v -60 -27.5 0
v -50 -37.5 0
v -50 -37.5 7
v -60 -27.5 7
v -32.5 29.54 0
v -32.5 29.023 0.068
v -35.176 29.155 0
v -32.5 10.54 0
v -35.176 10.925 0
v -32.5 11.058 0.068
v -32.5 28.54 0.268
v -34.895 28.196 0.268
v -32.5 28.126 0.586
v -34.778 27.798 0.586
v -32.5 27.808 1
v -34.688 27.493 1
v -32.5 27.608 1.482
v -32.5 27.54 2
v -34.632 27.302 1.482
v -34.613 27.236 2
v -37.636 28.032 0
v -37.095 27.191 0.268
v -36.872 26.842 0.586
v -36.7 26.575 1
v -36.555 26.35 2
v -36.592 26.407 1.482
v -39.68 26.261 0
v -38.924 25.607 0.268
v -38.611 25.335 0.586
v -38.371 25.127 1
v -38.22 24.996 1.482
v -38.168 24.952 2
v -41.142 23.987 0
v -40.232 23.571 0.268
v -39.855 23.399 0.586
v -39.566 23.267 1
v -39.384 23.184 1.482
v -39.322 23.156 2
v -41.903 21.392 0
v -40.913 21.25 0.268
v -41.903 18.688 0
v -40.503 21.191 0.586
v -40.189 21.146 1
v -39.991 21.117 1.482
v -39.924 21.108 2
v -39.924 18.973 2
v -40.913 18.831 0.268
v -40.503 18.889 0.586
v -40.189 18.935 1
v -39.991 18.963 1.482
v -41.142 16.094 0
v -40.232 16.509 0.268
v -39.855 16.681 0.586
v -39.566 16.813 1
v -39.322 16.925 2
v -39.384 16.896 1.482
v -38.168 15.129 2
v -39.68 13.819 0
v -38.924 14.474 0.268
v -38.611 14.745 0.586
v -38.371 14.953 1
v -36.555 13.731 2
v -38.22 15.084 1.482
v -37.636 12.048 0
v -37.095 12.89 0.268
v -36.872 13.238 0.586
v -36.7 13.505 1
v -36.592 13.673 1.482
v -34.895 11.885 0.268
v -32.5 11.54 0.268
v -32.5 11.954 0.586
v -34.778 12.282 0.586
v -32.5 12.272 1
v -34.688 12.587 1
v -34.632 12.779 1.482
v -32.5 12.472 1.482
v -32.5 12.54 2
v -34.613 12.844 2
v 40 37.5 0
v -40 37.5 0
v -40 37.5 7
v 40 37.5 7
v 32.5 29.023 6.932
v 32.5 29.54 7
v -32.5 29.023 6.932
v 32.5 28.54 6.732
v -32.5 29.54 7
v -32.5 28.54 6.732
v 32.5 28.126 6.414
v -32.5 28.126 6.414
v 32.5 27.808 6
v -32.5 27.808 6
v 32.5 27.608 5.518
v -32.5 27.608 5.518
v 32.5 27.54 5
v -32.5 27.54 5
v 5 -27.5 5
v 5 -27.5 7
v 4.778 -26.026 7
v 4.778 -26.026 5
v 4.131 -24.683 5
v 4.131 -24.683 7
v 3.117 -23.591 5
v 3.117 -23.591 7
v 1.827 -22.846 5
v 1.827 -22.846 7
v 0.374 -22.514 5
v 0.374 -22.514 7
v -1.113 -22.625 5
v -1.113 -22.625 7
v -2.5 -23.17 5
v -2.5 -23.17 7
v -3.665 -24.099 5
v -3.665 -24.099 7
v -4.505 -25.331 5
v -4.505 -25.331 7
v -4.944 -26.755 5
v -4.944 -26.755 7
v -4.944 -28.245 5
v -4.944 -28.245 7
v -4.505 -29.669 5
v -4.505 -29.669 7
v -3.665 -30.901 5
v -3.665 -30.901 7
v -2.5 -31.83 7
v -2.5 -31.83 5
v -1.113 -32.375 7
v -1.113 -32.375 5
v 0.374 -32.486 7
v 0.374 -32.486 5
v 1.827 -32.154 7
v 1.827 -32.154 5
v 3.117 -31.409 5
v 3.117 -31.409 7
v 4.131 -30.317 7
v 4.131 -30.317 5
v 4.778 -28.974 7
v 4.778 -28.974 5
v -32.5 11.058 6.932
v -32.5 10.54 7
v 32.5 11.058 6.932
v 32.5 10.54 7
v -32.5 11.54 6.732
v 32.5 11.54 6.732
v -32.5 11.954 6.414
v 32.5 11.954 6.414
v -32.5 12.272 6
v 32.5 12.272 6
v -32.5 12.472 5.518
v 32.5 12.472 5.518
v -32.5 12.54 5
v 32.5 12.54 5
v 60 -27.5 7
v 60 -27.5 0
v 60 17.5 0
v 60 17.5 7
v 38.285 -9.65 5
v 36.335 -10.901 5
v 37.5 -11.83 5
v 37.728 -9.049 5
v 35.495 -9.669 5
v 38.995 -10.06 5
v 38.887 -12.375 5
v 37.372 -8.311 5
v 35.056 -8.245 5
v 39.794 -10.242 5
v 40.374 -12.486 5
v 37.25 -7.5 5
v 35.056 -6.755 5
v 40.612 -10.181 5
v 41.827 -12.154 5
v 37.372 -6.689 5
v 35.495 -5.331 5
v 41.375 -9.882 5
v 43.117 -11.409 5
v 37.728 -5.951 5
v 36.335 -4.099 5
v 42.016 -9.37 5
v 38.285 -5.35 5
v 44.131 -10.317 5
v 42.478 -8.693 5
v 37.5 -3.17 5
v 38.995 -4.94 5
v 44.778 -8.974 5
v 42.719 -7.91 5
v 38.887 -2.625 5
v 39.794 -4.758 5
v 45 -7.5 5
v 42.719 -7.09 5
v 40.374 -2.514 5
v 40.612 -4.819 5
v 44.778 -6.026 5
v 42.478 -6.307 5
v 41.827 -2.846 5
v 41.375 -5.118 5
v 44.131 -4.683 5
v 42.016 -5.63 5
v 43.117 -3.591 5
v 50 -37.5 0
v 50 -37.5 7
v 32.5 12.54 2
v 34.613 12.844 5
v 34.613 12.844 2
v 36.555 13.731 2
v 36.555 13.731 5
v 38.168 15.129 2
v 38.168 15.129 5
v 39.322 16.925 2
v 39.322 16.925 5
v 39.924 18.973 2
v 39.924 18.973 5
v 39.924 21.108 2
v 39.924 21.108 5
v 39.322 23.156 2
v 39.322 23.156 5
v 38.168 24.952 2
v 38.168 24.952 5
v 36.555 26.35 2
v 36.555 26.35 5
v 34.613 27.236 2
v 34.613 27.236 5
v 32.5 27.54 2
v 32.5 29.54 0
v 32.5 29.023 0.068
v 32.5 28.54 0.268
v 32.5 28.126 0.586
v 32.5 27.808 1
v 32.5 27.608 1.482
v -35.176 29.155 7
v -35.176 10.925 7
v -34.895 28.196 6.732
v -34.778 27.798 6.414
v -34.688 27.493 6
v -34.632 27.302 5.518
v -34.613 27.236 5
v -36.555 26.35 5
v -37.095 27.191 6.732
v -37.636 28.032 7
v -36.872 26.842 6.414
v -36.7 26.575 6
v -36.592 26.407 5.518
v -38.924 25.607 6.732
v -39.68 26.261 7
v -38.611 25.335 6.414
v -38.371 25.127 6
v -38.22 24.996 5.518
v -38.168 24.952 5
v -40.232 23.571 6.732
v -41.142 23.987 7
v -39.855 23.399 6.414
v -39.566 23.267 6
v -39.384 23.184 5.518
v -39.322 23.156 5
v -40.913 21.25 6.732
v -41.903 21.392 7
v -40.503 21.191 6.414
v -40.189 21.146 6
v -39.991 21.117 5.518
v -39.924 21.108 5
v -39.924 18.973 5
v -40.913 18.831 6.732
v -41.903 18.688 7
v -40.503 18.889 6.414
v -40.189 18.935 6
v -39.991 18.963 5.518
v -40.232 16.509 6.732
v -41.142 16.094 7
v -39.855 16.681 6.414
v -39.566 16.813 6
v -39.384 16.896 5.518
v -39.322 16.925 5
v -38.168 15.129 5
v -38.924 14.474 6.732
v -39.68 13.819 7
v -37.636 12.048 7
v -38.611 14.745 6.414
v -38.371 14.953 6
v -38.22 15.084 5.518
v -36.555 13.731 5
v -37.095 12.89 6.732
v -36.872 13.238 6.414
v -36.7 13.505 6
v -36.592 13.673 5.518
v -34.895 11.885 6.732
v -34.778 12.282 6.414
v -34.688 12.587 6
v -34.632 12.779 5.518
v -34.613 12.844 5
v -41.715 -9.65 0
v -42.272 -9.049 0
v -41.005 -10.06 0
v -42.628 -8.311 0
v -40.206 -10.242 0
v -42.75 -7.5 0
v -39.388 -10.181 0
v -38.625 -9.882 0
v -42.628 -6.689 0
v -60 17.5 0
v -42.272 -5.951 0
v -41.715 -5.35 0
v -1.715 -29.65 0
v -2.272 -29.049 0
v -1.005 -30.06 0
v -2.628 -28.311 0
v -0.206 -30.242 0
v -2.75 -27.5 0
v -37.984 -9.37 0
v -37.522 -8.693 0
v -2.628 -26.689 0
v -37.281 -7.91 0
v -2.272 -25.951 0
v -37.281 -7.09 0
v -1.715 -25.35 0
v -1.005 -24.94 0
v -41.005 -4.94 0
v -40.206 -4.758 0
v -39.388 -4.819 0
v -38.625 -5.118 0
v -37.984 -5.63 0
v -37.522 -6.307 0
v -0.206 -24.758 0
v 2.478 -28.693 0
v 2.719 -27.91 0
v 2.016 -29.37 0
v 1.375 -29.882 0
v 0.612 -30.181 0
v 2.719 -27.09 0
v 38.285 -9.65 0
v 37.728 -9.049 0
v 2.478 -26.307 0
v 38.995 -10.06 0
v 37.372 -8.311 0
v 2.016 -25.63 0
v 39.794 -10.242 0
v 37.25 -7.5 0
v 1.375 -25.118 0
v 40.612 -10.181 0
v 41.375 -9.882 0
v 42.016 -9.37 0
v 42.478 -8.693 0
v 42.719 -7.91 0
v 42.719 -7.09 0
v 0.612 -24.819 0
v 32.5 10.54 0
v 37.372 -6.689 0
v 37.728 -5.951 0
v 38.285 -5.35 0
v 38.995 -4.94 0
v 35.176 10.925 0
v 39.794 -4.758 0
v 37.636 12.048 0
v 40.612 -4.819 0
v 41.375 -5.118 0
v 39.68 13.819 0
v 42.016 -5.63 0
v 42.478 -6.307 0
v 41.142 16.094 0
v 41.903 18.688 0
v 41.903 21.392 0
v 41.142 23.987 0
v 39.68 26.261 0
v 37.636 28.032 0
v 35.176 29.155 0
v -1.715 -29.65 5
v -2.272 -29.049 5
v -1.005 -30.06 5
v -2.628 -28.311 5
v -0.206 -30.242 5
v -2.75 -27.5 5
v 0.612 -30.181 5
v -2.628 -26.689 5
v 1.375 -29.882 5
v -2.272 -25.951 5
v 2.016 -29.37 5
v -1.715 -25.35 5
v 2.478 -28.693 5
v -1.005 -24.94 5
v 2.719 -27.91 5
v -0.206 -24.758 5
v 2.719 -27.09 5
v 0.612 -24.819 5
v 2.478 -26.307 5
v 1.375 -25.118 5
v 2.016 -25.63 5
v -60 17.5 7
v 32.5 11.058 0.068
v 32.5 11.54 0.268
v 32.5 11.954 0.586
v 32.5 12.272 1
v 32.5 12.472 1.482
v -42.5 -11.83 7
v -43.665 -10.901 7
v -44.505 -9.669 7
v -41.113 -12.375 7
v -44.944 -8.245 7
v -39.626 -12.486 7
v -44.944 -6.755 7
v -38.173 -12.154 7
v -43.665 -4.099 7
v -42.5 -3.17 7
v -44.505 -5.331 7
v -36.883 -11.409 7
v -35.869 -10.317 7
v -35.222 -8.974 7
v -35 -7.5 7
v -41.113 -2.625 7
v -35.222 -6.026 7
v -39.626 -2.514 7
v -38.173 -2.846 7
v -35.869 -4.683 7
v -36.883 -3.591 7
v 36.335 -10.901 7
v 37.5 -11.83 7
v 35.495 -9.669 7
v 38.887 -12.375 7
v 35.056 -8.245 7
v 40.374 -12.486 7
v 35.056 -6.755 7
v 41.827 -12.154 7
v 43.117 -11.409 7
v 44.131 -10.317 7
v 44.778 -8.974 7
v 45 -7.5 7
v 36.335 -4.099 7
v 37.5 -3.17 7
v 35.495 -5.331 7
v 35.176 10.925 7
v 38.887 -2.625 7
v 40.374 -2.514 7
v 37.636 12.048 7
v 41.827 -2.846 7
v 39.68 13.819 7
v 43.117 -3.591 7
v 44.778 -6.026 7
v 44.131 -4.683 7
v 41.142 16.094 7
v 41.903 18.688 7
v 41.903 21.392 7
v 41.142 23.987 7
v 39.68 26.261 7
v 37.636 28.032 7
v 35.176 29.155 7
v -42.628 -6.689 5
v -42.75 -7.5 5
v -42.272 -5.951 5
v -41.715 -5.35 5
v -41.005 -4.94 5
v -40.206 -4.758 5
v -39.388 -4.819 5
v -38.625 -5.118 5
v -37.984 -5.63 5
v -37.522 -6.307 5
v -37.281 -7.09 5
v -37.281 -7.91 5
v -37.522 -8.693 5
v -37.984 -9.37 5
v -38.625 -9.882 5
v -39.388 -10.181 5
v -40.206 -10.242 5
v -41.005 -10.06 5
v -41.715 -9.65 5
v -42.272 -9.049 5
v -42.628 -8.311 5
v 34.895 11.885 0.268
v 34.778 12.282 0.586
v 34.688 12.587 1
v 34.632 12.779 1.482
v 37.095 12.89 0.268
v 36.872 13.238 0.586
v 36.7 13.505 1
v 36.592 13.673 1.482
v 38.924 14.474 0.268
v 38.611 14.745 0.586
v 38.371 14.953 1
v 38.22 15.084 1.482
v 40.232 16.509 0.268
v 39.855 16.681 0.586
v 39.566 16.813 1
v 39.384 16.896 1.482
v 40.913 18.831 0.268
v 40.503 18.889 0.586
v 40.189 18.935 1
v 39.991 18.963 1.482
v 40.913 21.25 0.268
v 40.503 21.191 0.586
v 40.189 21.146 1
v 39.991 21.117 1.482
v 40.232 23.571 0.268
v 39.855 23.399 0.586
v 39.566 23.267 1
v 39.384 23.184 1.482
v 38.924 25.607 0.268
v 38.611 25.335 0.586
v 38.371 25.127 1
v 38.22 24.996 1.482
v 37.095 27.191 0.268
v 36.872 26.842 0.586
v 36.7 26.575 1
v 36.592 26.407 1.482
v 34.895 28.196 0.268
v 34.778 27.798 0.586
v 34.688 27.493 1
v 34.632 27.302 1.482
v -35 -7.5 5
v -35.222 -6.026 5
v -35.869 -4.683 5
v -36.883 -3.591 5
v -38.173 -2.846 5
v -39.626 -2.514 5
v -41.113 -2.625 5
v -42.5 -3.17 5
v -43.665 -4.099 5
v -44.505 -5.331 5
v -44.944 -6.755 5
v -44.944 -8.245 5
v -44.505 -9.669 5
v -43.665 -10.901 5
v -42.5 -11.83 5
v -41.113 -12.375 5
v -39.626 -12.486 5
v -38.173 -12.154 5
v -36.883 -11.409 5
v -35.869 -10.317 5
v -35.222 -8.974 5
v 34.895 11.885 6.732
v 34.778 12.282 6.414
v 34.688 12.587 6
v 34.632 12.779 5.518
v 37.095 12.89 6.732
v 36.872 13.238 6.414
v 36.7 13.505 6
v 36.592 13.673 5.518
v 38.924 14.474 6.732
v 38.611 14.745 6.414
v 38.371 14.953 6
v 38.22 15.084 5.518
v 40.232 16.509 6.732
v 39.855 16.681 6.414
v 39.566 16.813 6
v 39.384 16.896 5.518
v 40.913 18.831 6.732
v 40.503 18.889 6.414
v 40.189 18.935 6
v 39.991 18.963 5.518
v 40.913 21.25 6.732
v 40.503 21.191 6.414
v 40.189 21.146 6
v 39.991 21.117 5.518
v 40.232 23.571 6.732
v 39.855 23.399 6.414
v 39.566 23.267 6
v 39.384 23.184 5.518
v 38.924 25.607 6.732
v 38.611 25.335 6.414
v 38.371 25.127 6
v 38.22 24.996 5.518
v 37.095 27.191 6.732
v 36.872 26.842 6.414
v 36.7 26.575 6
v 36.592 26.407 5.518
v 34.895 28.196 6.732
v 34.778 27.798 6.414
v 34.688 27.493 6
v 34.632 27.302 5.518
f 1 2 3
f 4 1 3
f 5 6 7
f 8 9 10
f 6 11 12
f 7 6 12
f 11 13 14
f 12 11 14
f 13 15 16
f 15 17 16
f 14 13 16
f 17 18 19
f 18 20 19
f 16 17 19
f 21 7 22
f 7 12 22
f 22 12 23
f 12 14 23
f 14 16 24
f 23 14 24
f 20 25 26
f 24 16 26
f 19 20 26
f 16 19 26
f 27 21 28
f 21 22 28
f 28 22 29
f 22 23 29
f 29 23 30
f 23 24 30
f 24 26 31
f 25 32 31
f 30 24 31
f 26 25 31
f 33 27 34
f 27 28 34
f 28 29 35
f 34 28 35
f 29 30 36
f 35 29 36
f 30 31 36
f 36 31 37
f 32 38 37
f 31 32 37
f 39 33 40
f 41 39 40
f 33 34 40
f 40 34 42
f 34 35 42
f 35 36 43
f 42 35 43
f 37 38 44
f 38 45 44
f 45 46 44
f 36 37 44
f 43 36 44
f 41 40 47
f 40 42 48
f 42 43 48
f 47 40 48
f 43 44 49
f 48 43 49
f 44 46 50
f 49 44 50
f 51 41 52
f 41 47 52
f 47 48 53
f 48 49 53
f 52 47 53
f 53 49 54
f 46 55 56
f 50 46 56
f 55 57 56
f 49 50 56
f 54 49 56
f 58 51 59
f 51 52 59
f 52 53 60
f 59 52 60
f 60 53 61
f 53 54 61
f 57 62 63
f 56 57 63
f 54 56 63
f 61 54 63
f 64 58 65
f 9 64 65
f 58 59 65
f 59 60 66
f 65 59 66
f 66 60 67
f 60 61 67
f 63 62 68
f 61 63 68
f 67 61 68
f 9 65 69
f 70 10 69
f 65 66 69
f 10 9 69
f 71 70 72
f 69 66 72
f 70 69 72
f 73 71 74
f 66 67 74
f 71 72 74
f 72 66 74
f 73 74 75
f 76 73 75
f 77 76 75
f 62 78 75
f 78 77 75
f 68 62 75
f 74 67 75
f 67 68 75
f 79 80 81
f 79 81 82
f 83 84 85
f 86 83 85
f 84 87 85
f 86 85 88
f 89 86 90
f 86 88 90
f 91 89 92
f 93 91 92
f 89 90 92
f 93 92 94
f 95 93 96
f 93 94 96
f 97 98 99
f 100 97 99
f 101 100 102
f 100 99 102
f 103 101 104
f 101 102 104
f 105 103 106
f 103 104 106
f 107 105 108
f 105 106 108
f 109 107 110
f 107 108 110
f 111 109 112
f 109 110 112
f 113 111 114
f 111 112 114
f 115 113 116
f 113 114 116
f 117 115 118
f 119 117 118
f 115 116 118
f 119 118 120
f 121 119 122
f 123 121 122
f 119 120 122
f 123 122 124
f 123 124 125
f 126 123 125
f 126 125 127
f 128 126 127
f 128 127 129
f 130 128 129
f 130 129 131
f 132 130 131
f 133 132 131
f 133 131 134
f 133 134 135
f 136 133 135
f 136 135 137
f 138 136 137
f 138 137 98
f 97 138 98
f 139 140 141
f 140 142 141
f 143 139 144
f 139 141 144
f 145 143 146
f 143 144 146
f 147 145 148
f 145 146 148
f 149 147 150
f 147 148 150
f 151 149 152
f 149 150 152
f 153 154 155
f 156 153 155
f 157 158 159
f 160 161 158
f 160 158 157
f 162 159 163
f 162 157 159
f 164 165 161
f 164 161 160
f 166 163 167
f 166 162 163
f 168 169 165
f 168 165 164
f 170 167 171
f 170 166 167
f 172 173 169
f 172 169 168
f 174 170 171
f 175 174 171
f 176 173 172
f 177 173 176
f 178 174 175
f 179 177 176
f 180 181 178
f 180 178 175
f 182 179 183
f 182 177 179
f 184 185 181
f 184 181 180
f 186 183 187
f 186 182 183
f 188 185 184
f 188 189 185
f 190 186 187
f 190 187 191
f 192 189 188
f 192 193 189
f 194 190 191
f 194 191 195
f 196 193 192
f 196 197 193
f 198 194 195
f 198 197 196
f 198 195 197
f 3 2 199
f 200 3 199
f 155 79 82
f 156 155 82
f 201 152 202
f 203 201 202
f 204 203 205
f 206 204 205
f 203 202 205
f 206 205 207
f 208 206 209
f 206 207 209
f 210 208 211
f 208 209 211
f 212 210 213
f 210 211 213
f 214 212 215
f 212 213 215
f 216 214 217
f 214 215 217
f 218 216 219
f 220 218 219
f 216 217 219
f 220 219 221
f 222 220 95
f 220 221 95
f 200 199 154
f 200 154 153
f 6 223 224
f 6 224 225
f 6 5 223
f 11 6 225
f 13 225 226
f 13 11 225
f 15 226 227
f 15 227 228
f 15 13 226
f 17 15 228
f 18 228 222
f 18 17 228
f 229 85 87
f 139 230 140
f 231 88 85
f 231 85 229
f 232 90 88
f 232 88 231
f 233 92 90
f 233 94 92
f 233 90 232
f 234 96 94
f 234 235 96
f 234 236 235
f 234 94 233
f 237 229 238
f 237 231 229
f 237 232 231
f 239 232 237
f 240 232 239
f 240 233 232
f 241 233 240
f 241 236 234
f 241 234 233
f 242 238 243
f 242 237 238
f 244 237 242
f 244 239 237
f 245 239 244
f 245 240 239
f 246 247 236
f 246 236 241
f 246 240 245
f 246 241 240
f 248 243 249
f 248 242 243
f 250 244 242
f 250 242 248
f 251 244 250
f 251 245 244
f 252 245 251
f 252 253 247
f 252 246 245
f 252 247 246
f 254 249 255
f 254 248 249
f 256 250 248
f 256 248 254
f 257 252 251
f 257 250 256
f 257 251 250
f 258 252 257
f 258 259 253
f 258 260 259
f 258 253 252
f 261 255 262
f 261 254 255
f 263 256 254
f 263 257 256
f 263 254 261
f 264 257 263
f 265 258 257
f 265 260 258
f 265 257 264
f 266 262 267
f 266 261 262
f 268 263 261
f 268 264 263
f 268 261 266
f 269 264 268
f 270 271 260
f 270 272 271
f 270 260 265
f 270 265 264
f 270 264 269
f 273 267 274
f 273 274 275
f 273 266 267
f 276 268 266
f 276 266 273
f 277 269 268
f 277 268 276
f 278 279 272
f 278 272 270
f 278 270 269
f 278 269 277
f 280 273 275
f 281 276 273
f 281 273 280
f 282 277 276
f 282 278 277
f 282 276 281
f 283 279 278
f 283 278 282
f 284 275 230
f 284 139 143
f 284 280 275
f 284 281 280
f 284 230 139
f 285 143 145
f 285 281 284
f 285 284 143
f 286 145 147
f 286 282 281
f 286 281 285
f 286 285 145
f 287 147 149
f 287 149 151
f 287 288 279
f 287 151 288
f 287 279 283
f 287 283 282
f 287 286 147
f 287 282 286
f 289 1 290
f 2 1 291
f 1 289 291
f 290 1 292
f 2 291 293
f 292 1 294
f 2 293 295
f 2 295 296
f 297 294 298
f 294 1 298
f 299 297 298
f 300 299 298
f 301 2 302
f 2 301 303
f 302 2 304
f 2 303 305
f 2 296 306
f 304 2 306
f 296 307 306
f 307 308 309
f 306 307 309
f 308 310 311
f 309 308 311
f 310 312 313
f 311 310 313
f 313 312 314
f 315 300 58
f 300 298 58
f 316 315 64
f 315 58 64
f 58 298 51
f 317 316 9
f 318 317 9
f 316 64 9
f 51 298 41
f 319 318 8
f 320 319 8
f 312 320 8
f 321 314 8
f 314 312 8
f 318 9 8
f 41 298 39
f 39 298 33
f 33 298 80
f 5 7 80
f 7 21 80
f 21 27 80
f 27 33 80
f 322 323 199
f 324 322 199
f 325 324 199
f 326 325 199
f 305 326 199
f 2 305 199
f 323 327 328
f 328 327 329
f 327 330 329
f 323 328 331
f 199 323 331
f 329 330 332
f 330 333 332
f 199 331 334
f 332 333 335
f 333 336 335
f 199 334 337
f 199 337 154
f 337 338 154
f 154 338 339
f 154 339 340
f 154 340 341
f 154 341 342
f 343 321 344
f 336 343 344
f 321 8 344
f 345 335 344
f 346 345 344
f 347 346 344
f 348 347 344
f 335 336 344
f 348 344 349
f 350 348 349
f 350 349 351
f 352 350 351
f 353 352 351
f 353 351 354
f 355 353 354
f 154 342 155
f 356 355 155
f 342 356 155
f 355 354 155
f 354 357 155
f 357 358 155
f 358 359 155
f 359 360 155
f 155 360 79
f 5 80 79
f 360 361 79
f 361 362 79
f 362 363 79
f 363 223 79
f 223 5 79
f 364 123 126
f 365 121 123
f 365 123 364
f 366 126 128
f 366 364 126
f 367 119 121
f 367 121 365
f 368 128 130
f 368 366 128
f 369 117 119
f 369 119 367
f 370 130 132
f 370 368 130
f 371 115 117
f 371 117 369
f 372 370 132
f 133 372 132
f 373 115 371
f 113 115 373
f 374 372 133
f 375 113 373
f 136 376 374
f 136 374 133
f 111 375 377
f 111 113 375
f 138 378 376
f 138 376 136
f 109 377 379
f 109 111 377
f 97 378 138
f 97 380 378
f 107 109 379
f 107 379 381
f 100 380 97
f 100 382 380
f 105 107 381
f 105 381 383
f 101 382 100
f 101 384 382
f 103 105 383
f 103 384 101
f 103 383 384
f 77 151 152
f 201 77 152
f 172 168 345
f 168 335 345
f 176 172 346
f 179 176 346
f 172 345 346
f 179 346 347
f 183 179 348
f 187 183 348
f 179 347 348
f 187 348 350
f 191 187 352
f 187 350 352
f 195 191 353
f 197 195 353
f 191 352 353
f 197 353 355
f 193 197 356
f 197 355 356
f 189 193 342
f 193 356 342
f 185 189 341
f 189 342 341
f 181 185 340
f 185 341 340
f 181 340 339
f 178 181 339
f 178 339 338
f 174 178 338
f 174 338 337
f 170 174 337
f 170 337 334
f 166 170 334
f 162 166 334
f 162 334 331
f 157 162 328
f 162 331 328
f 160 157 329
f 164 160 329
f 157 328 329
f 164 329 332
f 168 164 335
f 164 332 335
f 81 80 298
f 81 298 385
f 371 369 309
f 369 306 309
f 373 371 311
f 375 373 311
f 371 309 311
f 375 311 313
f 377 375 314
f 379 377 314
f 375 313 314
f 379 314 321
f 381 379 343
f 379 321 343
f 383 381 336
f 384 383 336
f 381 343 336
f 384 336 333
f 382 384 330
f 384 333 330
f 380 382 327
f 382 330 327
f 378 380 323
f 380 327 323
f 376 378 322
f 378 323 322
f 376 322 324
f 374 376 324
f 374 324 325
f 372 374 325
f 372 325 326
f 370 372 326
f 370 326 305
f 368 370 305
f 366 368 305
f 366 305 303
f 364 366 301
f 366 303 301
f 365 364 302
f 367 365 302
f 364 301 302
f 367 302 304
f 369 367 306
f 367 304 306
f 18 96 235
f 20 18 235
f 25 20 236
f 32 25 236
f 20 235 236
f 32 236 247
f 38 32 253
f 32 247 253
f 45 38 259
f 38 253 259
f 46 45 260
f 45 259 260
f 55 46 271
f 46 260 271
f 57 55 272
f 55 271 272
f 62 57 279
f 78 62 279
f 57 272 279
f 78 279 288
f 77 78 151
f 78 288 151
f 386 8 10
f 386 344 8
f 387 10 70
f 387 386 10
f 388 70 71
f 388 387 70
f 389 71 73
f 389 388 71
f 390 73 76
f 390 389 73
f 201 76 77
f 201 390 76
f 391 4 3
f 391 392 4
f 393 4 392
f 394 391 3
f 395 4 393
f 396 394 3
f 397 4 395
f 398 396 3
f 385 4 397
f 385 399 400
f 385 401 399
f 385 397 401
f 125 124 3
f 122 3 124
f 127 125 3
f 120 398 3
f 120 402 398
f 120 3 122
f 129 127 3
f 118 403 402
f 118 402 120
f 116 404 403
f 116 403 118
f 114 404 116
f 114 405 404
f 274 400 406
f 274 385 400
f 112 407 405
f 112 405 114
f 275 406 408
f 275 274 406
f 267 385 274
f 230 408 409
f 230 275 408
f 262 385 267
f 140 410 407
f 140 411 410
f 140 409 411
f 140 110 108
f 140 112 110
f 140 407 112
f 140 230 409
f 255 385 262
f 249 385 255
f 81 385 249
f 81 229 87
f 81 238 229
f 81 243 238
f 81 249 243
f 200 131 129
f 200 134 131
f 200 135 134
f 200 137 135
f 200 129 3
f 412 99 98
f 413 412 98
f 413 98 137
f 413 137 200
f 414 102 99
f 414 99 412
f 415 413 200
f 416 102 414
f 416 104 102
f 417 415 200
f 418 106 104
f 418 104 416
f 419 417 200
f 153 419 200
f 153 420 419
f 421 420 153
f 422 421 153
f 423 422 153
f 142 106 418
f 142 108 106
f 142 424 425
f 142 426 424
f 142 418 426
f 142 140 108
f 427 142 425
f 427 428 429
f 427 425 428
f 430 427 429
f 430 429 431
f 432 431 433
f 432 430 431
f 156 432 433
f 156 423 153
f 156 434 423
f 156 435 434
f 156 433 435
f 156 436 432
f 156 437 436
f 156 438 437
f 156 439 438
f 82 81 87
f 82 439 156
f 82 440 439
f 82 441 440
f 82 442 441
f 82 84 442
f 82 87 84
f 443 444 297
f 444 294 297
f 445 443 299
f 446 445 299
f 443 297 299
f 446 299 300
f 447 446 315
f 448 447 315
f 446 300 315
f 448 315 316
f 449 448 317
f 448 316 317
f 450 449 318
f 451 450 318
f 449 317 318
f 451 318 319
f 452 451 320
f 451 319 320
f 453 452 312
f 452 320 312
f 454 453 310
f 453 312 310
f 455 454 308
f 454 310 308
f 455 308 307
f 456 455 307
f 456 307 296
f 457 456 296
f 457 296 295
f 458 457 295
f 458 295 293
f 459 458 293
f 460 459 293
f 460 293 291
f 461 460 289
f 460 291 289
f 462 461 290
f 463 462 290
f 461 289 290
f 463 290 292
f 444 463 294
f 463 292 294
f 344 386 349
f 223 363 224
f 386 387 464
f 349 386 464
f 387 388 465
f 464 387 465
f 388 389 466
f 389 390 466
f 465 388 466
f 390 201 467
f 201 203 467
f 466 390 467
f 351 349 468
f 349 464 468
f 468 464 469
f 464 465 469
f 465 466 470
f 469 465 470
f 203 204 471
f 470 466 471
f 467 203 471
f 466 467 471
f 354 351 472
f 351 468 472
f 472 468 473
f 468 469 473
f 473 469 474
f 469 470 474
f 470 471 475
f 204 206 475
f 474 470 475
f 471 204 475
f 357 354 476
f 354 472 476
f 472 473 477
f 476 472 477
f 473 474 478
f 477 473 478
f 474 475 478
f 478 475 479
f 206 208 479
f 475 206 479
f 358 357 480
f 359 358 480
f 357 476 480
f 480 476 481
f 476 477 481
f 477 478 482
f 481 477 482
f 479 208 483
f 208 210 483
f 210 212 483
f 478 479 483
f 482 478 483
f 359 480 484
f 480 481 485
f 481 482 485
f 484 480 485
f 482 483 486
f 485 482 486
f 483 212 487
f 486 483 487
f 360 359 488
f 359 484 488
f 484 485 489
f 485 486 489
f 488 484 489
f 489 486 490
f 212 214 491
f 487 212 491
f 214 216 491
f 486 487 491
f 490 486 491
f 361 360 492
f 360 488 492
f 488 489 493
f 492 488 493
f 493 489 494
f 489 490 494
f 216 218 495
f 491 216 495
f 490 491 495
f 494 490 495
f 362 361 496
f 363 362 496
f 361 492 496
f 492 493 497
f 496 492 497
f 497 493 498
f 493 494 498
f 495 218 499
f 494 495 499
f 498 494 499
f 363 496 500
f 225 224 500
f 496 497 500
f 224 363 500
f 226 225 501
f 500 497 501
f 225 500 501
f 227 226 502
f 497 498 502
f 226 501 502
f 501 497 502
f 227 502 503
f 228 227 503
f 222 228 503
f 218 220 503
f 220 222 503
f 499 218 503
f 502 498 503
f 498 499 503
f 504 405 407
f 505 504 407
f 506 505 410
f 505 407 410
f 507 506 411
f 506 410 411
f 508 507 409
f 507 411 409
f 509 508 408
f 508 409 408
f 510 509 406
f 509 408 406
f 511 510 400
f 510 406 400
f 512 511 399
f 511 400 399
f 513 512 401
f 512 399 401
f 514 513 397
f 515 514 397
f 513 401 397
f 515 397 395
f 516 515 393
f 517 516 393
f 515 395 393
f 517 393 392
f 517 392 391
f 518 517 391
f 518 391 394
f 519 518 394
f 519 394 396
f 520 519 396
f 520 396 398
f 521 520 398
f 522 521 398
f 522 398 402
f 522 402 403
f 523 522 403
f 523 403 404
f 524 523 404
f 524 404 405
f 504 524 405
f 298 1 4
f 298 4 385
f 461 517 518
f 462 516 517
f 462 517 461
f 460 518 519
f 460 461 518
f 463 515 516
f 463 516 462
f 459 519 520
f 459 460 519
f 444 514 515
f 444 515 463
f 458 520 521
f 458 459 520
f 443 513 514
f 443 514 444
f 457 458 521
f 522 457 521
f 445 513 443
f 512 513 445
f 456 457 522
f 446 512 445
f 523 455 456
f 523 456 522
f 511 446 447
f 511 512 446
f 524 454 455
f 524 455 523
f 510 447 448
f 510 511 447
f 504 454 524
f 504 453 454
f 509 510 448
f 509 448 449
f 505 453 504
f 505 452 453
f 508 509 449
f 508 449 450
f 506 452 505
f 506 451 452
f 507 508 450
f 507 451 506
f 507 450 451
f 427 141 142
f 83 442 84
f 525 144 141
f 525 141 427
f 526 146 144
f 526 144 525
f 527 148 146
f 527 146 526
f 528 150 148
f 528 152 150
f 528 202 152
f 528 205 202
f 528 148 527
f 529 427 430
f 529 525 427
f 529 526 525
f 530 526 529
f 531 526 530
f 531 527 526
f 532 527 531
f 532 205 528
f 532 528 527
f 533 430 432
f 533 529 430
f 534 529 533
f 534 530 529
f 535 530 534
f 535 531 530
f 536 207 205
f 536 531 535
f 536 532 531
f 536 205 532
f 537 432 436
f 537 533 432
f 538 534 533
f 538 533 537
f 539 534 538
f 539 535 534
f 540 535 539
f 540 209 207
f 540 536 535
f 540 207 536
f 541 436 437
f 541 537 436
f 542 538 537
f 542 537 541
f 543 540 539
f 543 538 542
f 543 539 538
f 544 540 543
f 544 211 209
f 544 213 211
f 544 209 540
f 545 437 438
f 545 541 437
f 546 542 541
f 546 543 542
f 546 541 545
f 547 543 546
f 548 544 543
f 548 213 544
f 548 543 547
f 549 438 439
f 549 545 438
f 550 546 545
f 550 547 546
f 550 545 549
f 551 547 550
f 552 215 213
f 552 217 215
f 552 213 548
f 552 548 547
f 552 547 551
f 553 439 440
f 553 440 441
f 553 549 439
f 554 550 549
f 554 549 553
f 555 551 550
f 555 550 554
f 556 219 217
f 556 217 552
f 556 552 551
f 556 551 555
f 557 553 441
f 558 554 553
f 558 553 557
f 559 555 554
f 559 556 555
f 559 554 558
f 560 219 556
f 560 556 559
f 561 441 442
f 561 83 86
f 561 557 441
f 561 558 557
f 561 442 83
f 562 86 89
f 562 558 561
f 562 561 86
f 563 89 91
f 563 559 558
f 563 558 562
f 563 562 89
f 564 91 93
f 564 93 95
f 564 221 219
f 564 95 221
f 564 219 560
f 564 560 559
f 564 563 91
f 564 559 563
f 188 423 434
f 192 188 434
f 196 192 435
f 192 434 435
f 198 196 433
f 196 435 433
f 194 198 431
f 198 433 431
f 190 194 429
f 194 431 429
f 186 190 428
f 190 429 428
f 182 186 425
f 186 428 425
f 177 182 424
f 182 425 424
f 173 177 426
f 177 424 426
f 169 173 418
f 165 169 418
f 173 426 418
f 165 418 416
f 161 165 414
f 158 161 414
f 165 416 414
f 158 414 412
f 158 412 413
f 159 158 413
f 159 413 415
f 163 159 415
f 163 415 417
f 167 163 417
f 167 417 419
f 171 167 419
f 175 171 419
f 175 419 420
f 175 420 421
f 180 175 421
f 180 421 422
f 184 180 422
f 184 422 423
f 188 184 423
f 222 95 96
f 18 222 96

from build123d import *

# Parameters (mm, degrees)
F0_W           = 120
F0_H           = 75
F1_DEPTH       = 7
F2_SIZE        = 20
F3_W           = 65
F3_H           = 0.0804045208
F4_DEPTH       = 25
F5_DEPTH       = 5
F6_SIZE        = 10
F7_R           = 2
F9_D           = 5.5
F9_CBORE_D     = 10
F9_CBORE_DEPTH = 2


with BuildPart() as f1:
    # F0 (on Top) → F1 (new body)
    with BuildSketch(Plane.XY):
        Rectangle(F0_W, F0_H)
    extrude(amount=F1_DEPTH)

    # F2
    f2_edges = [f1.edges().sort_by_distance(p)[0] for p in [
        (-60, 37.5, 3.5),
        (60, 37.5, 3.5),
    ]]
    chamfer(f2_edges, length=F2_SIZE)

    # F3 (on face) → F4 (cut)
    with BuildSketch(Plane.XY.offset(7)):
        with BuildLine():
            ThreePointArc((32.5, 12.5402022604), (40, 20.0402022604), (32.5, 27.5402022604))
            Line((32.5, 27.5402022604), (-32.5, 27.5402022604))
            ThreePointArc((-32.5, 27.5402022604), (-40, 20.0402022604), (-32.5, 12.5402022604))
            Line((-32.5, 12.5402022604), (32.5, 12.5402022604))
        make_face()
        with Locations((0, 20)):
            Rectangle(F3_W, F3_H, mode=Mode.SUBTRACT)
    extrude(amount=-F4_DEPTH, mode=Mode.SUBTRACT)

    # F5 (cut): a face of the model
    f5_faces = [f1.faces().sort_by_distance(p)[0] for p in [
        (0, 20.0402022604, 3.5),
    ]]
    extrude(f5_faces, amount=-F5_DEPTH, mode=Mode.SUBTRACT)

    # F6
    f6_edges = [f1.edges().sort_by_distance(p)[0] for p in [
        (-60, -37.5, 3.5),
        (60, -37.5, 3.5),
    ]]
    chamfer(f6_edges, length=F6_SIZE)

    # F7
    f7_edges = [f1.edges().sort_by_distance(p)[0] for p in [
        (40, 20.040202, 7),
        (40, 20.040202, 0),
    ]]
    fillet(f7_edges, radius=F7_R)

    # F9 (through all)
    with Locations(Plane.XY.offset(7)):
        with Locations((-40, -7.5), (0, -27.5), (40, -7.5)):
            CounterBoreHole(F9_D / 2, F9_CBORE_D / 2, F9_CBORE_DEPTH)


solid = f1.part
